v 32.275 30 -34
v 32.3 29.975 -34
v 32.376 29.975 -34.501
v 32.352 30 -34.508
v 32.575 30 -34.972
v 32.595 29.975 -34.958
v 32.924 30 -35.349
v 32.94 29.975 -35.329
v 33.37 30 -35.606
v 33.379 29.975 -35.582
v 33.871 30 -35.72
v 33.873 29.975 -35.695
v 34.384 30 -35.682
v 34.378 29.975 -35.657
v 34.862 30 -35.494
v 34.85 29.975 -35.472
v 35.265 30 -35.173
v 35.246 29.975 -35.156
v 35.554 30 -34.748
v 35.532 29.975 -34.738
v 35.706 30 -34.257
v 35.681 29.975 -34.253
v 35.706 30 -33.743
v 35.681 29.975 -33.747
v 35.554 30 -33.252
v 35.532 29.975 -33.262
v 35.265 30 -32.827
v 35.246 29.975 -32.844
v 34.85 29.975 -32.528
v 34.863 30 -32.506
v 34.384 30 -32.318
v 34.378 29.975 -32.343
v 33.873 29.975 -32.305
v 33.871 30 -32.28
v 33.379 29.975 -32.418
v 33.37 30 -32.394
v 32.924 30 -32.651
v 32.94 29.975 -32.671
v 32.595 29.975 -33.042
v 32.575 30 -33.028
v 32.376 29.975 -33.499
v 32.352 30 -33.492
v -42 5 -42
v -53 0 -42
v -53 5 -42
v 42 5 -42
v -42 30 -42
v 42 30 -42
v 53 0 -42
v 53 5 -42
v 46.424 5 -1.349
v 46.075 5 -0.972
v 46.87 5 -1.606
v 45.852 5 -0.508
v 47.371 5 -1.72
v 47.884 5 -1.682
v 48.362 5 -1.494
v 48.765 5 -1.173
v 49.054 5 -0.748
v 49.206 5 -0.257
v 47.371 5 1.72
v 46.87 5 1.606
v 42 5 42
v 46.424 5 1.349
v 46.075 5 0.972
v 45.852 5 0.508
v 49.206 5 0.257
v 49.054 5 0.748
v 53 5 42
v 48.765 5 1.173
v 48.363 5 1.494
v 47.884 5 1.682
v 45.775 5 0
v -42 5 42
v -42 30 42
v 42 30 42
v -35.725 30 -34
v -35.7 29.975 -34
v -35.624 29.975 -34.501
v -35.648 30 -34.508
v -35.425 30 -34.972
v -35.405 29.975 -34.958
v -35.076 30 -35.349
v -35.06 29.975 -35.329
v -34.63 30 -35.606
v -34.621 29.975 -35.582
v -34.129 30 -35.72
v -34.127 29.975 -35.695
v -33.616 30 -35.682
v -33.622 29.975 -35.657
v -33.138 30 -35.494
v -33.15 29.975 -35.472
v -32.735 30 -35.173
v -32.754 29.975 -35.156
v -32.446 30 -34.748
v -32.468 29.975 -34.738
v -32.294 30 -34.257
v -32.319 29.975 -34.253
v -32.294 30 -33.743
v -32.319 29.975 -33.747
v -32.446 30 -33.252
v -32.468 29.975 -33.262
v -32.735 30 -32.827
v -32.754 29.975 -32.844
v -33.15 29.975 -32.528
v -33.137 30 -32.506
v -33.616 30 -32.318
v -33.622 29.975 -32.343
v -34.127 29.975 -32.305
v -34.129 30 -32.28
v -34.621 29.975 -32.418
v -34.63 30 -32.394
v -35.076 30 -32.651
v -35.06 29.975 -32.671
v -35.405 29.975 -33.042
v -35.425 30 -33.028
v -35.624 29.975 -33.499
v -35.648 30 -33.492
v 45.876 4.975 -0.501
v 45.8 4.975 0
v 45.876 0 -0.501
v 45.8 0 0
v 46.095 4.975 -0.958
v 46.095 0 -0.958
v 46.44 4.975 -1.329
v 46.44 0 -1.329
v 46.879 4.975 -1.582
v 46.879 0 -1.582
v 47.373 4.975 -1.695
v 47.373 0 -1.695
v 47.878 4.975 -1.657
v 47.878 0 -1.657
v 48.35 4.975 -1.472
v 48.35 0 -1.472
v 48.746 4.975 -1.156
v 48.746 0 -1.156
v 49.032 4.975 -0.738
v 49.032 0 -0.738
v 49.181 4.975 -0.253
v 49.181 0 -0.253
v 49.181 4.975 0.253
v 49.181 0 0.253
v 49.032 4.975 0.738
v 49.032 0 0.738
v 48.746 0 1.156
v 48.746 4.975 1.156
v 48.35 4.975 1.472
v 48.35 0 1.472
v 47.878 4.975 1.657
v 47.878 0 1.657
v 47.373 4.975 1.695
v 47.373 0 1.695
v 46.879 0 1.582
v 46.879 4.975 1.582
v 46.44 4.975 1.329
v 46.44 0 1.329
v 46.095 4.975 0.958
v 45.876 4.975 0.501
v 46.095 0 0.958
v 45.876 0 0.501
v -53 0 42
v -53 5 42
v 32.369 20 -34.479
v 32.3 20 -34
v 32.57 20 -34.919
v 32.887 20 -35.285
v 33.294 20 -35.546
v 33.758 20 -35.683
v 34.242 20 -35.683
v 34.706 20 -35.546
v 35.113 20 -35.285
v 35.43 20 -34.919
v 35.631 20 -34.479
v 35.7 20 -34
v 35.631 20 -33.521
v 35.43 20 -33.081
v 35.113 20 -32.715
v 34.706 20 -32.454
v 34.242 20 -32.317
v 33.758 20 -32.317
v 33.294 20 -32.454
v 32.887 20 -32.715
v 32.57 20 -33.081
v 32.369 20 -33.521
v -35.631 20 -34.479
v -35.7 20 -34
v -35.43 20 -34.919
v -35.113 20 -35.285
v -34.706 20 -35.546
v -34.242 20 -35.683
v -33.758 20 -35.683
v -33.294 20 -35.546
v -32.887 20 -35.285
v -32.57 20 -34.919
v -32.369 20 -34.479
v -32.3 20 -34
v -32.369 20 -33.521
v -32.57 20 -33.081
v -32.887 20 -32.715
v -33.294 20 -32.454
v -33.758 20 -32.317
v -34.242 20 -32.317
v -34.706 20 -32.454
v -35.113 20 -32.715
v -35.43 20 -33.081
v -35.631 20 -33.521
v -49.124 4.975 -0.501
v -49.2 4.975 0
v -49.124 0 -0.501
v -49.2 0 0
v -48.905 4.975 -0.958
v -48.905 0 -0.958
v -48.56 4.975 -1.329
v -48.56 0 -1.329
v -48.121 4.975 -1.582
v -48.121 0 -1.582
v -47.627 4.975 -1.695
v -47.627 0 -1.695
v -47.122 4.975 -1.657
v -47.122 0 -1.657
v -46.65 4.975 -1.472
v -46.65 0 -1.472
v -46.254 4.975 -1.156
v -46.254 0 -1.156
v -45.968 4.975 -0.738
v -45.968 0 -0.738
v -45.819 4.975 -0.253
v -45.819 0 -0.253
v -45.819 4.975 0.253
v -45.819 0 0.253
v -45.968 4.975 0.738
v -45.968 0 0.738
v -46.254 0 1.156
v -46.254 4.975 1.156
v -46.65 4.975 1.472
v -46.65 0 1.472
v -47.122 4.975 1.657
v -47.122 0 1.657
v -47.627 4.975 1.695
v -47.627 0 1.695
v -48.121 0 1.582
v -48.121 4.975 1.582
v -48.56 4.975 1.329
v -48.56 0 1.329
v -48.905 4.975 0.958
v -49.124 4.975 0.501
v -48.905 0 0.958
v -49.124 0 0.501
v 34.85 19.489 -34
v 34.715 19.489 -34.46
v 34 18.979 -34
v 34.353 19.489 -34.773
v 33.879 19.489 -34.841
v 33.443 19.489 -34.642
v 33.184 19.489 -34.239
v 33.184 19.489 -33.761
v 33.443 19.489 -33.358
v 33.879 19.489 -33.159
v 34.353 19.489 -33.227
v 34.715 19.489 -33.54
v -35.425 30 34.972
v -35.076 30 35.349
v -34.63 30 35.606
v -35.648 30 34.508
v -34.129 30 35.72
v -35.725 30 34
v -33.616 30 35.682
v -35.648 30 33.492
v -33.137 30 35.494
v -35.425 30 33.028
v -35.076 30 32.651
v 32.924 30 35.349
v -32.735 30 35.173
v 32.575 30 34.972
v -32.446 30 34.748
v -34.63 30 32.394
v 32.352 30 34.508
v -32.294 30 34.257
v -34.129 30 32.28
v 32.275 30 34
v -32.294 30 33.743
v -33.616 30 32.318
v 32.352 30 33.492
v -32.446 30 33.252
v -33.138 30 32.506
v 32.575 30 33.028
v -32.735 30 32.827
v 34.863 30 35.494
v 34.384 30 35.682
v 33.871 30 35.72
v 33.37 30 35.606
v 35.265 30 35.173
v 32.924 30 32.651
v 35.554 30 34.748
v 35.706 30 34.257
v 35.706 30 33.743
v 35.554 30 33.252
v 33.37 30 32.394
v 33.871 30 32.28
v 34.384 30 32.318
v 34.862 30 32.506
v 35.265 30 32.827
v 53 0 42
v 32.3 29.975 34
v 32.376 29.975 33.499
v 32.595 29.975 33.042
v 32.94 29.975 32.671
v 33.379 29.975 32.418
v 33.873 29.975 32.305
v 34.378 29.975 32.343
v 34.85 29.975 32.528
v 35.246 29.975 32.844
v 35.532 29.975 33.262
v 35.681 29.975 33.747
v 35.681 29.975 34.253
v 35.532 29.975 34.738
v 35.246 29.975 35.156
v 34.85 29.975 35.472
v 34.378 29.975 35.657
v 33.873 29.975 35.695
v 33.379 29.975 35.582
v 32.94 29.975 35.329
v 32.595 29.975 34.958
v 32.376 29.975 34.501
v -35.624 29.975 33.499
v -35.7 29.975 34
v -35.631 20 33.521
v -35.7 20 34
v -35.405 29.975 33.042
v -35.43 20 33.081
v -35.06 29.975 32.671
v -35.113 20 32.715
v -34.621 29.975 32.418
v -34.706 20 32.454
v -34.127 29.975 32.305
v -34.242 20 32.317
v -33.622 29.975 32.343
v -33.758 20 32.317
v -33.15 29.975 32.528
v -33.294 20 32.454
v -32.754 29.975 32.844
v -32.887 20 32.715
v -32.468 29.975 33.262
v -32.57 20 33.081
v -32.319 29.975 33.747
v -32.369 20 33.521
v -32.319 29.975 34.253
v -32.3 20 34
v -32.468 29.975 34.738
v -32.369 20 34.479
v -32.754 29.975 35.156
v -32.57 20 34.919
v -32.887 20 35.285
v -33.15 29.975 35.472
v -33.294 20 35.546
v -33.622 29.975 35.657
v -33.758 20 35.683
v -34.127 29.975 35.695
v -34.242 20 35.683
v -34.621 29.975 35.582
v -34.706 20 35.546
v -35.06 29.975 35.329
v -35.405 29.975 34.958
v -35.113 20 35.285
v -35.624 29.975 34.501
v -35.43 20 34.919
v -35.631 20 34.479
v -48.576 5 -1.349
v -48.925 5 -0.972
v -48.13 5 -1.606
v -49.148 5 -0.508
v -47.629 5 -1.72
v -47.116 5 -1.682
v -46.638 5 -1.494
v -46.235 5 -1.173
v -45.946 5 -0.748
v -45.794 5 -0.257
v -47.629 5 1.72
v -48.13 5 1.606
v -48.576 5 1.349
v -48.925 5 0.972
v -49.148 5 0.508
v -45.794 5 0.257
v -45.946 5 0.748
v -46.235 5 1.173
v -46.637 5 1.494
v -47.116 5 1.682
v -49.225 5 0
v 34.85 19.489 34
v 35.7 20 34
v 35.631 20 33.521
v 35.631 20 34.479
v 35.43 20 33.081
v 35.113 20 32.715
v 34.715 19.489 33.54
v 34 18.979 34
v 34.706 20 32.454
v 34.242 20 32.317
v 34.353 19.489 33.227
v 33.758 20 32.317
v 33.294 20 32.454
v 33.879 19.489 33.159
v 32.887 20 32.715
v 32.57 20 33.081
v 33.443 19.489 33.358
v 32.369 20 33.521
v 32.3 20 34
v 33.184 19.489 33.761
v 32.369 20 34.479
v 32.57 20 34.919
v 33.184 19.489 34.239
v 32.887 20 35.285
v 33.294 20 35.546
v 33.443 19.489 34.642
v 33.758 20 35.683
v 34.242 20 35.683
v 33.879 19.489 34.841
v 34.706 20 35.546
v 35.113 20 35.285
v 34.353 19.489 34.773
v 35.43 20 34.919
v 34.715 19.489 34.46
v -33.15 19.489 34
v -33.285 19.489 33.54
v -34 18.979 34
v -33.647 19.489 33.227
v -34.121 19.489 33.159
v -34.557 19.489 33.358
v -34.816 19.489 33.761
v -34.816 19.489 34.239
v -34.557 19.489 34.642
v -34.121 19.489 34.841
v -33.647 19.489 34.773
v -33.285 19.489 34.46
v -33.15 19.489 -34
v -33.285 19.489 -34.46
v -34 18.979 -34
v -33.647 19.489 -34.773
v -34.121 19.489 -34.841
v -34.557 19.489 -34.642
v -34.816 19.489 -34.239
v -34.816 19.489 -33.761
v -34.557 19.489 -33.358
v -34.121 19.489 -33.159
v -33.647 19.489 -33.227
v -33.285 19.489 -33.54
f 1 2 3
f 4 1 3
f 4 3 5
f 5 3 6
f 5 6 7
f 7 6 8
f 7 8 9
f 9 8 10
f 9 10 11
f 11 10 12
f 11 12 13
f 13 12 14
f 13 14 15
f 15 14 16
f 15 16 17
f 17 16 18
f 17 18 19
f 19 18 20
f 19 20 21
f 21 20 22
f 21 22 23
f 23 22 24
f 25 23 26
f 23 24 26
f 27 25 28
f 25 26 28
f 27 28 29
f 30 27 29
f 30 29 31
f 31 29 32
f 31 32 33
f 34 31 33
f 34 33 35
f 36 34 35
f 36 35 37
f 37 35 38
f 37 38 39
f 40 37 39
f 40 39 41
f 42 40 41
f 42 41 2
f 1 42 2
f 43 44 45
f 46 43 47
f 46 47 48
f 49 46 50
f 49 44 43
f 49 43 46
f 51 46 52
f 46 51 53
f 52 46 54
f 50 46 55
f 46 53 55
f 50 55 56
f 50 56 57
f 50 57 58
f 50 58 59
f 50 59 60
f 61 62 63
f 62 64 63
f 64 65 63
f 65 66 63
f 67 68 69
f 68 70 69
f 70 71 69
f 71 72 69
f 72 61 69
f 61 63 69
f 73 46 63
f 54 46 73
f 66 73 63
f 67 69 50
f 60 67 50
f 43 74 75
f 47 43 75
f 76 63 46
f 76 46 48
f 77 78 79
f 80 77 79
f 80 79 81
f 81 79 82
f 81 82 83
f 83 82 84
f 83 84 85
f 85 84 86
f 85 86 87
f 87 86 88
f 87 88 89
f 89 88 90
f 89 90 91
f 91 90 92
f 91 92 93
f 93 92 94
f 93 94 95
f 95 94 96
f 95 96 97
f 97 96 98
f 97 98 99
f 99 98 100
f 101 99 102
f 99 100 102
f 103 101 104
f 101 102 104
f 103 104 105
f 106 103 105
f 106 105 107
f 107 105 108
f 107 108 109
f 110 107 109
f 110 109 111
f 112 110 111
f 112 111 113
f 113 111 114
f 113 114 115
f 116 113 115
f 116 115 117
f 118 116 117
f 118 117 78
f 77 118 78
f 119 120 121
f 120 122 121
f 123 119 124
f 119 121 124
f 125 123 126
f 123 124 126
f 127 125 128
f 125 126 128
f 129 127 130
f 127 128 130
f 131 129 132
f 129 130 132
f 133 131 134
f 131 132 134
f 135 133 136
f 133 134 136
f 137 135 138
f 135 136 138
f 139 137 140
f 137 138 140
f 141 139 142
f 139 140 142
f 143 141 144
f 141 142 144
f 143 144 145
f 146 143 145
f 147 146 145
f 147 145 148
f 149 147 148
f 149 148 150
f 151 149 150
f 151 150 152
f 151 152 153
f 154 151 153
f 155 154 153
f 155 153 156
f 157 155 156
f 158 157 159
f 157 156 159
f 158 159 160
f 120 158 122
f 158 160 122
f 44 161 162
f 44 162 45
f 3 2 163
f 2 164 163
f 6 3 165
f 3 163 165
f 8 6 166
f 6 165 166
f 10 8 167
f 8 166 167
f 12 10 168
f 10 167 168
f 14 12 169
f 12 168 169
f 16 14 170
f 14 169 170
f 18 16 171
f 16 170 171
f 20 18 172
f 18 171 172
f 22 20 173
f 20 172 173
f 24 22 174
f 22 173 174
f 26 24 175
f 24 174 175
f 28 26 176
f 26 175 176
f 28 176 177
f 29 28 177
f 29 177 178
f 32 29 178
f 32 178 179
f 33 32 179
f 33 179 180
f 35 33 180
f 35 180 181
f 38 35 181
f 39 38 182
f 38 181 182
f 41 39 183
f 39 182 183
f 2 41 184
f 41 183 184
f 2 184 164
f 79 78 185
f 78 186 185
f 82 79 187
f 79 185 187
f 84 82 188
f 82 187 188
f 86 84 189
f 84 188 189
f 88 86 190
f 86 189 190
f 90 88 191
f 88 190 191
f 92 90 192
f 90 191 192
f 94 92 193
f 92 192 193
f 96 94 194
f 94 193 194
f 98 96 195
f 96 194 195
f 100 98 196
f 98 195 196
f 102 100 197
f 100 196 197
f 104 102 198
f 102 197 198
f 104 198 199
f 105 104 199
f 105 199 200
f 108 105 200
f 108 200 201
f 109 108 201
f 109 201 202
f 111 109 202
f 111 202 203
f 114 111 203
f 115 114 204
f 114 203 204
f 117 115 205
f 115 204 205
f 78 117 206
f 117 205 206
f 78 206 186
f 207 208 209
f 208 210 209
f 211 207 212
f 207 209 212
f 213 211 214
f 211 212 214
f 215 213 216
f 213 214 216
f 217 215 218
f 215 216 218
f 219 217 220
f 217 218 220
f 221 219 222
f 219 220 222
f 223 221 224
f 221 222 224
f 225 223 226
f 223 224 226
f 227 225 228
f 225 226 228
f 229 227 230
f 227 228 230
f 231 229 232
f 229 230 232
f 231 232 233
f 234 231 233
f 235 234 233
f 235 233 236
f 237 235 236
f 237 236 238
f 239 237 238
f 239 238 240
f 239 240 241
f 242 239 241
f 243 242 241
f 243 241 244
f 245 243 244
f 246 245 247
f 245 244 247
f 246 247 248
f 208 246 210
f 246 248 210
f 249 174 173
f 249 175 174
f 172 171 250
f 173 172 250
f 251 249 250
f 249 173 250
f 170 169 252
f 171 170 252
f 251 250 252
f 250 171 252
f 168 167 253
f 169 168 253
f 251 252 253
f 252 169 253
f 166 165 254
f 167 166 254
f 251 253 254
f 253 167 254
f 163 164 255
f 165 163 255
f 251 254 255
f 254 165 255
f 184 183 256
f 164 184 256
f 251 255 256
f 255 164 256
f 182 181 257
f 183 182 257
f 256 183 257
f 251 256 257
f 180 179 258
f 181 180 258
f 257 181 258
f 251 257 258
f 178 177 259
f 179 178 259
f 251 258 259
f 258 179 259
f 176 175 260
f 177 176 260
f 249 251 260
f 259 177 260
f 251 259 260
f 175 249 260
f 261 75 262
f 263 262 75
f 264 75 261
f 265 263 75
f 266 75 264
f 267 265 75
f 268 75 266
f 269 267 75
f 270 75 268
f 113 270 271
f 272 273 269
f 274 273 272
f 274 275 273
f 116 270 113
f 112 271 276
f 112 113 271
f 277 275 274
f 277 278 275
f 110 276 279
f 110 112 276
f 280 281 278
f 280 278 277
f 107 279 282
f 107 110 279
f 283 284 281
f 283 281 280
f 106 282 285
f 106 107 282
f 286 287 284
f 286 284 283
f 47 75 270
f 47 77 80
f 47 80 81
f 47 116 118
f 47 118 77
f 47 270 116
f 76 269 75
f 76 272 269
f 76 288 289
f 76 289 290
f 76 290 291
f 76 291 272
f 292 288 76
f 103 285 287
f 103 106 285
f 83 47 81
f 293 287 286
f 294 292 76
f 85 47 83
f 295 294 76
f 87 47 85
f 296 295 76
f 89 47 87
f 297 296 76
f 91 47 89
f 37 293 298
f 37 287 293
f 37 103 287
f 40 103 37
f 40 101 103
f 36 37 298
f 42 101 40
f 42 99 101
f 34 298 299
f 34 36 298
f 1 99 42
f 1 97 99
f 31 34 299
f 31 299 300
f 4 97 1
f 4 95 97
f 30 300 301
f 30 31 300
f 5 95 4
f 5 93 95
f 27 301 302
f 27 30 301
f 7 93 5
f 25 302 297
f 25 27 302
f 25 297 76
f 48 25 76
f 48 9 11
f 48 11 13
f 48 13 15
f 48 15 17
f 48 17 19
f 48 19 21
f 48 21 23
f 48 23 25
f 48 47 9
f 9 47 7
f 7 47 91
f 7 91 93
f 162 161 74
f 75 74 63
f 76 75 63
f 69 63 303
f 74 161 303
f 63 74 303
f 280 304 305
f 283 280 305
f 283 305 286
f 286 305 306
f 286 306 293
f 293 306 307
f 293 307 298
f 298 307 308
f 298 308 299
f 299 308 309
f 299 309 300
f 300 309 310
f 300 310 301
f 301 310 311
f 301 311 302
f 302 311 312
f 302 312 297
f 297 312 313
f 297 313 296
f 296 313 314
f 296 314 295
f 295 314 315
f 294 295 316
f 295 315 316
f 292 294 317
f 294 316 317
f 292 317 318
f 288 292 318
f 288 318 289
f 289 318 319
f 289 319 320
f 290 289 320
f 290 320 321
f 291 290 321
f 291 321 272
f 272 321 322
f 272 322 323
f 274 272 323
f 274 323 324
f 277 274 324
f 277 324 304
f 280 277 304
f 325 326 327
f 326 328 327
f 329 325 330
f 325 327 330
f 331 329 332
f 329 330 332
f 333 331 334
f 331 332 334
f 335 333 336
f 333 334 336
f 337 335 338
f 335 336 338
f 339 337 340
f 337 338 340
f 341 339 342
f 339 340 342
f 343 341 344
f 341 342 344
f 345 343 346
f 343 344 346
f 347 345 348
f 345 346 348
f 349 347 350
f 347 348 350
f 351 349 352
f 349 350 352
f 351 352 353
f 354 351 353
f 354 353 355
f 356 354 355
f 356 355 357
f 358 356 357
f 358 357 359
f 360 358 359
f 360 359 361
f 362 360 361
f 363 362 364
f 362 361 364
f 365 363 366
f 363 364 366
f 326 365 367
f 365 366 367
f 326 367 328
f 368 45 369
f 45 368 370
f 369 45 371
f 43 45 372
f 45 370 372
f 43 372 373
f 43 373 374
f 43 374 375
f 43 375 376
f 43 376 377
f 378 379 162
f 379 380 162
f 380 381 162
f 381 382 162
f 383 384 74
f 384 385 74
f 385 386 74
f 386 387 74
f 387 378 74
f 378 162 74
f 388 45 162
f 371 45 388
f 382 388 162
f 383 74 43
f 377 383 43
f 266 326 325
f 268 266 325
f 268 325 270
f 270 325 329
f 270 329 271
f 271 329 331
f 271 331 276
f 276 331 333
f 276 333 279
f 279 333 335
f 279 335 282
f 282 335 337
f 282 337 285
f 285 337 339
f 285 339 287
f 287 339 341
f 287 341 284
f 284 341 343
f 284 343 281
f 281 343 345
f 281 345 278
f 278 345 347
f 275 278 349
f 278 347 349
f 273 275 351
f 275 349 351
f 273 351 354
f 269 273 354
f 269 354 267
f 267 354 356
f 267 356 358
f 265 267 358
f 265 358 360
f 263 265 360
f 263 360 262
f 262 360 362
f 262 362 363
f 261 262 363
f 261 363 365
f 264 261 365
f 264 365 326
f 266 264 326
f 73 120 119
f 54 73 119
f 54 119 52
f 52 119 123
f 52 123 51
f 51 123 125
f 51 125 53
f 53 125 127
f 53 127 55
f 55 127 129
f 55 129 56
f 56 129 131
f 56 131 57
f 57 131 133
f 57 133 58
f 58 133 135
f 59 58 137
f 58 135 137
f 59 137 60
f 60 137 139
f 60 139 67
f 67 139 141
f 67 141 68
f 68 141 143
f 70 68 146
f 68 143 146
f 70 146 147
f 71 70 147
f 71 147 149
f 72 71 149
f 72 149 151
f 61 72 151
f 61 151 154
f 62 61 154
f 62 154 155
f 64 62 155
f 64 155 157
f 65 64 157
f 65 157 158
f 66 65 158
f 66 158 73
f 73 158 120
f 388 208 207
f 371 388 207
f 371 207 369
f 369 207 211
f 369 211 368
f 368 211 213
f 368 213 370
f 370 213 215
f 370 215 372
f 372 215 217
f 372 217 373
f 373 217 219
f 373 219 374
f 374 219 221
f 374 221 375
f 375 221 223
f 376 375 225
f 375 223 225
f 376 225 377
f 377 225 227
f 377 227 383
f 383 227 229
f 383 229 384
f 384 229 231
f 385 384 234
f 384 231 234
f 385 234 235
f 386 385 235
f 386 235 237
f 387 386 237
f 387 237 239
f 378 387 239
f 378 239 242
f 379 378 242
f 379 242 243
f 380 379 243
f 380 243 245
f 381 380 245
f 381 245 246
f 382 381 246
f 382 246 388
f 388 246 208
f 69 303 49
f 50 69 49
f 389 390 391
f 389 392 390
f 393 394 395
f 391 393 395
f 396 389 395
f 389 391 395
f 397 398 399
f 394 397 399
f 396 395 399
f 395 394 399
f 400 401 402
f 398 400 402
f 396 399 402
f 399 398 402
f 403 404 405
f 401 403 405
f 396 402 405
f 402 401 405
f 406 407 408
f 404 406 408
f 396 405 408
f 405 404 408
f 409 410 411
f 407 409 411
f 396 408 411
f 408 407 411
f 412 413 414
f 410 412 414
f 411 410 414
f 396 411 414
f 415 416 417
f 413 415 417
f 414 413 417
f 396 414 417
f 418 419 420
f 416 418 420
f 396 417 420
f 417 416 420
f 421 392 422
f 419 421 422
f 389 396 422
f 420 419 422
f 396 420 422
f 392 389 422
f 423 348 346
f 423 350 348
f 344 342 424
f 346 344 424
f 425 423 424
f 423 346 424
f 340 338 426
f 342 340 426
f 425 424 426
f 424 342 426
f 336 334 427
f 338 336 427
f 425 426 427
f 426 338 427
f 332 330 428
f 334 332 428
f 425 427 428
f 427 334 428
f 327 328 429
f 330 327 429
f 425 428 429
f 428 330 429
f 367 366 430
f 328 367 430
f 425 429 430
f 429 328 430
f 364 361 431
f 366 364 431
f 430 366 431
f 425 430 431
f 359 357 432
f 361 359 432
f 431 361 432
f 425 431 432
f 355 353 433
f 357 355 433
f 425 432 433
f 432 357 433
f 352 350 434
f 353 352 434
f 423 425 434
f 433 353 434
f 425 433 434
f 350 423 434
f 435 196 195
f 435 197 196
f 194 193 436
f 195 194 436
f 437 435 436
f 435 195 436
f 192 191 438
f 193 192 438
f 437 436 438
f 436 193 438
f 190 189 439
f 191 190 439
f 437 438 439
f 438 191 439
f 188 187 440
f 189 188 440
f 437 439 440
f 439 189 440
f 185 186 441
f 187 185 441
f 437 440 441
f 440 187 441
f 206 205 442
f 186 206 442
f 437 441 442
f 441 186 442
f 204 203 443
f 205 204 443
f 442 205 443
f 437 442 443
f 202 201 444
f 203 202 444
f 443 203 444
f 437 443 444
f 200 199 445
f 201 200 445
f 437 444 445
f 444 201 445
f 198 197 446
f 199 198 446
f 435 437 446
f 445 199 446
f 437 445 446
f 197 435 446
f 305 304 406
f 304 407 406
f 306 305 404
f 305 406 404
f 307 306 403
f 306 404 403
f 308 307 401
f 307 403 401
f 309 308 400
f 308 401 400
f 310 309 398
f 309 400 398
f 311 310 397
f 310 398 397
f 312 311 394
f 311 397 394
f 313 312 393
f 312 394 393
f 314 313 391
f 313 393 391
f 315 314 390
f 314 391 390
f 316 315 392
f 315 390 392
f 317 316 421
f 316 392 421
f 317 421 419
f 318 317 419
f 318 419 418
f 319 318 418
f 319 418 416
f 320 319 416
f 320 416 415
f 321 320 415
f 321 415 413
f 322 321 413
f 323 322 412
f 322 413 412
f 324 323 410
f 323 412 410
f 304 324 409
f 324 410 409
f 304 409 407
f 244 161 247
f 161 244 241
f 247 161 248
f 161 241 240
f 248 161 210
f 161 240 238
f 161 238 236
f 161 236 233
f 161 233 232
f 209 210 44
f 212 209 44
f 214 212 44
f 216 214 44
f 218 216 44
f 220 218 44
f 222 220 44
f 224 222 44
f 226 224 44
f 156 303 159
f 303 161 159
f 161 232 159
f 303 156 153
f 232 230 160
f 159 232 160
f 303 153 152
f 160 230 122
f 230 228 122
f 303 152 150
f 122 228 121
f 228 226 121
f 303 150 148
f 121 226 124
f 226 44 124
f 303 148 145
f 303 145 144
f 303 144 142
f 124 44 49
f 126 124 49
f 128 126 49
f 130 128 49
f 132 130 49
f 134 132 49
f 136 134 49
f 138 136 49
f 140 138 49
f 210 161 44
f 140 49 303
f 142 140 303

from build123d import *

# Parameters (mm, degrees)
SKETCH1_W                      = 106
SKETCH1_H                      = 84
BOSS_EXTRUDE1_DEPTH            = 30
SKETCH2_W                      = 11
SKETCH2_H                      = 25
CUT_EXTRUDE1_DEPTH             = 104.754517974
M3_CLEARANCE_HOLE1_D           = 3.4
M3_CLEARANCE_HOLE1_DEPTH       = 10
M3_CLEARANCE_HOLE1_CSINK_D     = 3.45
M3_CLEARANCE_HOLE1_CSINK_ANGLE = 90
M3_CLEARANCE_HOLE1_TIP         = 1.021463052
M3_CLEARANCE_HOLE2_D           = 3.4
M3_CLEARANCE_HOLE2_CSINK_D     = 3.45
M3_CLEARANCE_HOLE2_CSINK_ANGLE = 90


with BuildPart() as part:
    # Sketch1 → Boss-Extrude1 (new body)
    with BuildSketch(Plane(origin=(0, 0, 0), x_dir=(1, 0, 0), z_dir=(0, 1, 0))):
        Rectangle(SKETCH1_W, SKETCH1_H)
    extrude(amount=BOSS_EXTRUDE1_DEPTH)

    # Sketch2 → Cut-Extrude1 (cut, through all)
    with BuildSketch(Plane.XY.offset(42)):
        with Locations((47.5, 17.5)):
            Rectangle(SKETCH2_W, SKETCH2_H)
        with Locations((-47.5, 17.5)):
            Rectangle(SKETCH2_W, SKETCH2_H)
    extrude(amount=-CUT_EXTRUDE1_DEPTH, mode=Mode.SUBTRACT)

    # M3 Clearance Hole1
    with Locations(Plane(origin=(0, 30, 0), x_dir=(1, 0, 0), z_dir=(0, 1, 0))):
        with Locations((-34, 34), (34, 34), (34, -34), (-34, -34)):
            CounterSinkHole(M3_CLEARANCE_HOLE1_D / 2, M3_CLEARANCE_HOLE1_CSINK_D / 2, depth=M3_CLEARANCE_HOLE1_DEPTH, counter_sink_angle=M3_CLEARANCE_HOLE1_CSINK_ANGLE)
            with Locations((0, 0, -(M3_CLEARANCE_HOLE1_DEPTH + M3_CLEARANCE_HOLE1_TIP / 2))):  # 118° drill point
                Cone(0, M3_CLEARANCE_HOLE1_D / 2, M3_CLEARANCE_HOLE1_TIP, mode=Mode.SUBTRACT)

    # M3 Clearance Hole2 (through all)
    with Locations(Plane(origin=(0, 5, 0), x_dir=(1, 0, 0), z_dir=(0, 1, 0))):
        with Locations((-47.5, 0), (47.5, 0)):
            CounterSinkHole(M3_CLEARANCE_HOLE2_D / 2, M3_CLEARANCE_HOLE2_CSINK_D / 2, counter_sink_angle=M3_CLEARANCE_HOLE2_CSINK_ANGLE)


solid = part.part
